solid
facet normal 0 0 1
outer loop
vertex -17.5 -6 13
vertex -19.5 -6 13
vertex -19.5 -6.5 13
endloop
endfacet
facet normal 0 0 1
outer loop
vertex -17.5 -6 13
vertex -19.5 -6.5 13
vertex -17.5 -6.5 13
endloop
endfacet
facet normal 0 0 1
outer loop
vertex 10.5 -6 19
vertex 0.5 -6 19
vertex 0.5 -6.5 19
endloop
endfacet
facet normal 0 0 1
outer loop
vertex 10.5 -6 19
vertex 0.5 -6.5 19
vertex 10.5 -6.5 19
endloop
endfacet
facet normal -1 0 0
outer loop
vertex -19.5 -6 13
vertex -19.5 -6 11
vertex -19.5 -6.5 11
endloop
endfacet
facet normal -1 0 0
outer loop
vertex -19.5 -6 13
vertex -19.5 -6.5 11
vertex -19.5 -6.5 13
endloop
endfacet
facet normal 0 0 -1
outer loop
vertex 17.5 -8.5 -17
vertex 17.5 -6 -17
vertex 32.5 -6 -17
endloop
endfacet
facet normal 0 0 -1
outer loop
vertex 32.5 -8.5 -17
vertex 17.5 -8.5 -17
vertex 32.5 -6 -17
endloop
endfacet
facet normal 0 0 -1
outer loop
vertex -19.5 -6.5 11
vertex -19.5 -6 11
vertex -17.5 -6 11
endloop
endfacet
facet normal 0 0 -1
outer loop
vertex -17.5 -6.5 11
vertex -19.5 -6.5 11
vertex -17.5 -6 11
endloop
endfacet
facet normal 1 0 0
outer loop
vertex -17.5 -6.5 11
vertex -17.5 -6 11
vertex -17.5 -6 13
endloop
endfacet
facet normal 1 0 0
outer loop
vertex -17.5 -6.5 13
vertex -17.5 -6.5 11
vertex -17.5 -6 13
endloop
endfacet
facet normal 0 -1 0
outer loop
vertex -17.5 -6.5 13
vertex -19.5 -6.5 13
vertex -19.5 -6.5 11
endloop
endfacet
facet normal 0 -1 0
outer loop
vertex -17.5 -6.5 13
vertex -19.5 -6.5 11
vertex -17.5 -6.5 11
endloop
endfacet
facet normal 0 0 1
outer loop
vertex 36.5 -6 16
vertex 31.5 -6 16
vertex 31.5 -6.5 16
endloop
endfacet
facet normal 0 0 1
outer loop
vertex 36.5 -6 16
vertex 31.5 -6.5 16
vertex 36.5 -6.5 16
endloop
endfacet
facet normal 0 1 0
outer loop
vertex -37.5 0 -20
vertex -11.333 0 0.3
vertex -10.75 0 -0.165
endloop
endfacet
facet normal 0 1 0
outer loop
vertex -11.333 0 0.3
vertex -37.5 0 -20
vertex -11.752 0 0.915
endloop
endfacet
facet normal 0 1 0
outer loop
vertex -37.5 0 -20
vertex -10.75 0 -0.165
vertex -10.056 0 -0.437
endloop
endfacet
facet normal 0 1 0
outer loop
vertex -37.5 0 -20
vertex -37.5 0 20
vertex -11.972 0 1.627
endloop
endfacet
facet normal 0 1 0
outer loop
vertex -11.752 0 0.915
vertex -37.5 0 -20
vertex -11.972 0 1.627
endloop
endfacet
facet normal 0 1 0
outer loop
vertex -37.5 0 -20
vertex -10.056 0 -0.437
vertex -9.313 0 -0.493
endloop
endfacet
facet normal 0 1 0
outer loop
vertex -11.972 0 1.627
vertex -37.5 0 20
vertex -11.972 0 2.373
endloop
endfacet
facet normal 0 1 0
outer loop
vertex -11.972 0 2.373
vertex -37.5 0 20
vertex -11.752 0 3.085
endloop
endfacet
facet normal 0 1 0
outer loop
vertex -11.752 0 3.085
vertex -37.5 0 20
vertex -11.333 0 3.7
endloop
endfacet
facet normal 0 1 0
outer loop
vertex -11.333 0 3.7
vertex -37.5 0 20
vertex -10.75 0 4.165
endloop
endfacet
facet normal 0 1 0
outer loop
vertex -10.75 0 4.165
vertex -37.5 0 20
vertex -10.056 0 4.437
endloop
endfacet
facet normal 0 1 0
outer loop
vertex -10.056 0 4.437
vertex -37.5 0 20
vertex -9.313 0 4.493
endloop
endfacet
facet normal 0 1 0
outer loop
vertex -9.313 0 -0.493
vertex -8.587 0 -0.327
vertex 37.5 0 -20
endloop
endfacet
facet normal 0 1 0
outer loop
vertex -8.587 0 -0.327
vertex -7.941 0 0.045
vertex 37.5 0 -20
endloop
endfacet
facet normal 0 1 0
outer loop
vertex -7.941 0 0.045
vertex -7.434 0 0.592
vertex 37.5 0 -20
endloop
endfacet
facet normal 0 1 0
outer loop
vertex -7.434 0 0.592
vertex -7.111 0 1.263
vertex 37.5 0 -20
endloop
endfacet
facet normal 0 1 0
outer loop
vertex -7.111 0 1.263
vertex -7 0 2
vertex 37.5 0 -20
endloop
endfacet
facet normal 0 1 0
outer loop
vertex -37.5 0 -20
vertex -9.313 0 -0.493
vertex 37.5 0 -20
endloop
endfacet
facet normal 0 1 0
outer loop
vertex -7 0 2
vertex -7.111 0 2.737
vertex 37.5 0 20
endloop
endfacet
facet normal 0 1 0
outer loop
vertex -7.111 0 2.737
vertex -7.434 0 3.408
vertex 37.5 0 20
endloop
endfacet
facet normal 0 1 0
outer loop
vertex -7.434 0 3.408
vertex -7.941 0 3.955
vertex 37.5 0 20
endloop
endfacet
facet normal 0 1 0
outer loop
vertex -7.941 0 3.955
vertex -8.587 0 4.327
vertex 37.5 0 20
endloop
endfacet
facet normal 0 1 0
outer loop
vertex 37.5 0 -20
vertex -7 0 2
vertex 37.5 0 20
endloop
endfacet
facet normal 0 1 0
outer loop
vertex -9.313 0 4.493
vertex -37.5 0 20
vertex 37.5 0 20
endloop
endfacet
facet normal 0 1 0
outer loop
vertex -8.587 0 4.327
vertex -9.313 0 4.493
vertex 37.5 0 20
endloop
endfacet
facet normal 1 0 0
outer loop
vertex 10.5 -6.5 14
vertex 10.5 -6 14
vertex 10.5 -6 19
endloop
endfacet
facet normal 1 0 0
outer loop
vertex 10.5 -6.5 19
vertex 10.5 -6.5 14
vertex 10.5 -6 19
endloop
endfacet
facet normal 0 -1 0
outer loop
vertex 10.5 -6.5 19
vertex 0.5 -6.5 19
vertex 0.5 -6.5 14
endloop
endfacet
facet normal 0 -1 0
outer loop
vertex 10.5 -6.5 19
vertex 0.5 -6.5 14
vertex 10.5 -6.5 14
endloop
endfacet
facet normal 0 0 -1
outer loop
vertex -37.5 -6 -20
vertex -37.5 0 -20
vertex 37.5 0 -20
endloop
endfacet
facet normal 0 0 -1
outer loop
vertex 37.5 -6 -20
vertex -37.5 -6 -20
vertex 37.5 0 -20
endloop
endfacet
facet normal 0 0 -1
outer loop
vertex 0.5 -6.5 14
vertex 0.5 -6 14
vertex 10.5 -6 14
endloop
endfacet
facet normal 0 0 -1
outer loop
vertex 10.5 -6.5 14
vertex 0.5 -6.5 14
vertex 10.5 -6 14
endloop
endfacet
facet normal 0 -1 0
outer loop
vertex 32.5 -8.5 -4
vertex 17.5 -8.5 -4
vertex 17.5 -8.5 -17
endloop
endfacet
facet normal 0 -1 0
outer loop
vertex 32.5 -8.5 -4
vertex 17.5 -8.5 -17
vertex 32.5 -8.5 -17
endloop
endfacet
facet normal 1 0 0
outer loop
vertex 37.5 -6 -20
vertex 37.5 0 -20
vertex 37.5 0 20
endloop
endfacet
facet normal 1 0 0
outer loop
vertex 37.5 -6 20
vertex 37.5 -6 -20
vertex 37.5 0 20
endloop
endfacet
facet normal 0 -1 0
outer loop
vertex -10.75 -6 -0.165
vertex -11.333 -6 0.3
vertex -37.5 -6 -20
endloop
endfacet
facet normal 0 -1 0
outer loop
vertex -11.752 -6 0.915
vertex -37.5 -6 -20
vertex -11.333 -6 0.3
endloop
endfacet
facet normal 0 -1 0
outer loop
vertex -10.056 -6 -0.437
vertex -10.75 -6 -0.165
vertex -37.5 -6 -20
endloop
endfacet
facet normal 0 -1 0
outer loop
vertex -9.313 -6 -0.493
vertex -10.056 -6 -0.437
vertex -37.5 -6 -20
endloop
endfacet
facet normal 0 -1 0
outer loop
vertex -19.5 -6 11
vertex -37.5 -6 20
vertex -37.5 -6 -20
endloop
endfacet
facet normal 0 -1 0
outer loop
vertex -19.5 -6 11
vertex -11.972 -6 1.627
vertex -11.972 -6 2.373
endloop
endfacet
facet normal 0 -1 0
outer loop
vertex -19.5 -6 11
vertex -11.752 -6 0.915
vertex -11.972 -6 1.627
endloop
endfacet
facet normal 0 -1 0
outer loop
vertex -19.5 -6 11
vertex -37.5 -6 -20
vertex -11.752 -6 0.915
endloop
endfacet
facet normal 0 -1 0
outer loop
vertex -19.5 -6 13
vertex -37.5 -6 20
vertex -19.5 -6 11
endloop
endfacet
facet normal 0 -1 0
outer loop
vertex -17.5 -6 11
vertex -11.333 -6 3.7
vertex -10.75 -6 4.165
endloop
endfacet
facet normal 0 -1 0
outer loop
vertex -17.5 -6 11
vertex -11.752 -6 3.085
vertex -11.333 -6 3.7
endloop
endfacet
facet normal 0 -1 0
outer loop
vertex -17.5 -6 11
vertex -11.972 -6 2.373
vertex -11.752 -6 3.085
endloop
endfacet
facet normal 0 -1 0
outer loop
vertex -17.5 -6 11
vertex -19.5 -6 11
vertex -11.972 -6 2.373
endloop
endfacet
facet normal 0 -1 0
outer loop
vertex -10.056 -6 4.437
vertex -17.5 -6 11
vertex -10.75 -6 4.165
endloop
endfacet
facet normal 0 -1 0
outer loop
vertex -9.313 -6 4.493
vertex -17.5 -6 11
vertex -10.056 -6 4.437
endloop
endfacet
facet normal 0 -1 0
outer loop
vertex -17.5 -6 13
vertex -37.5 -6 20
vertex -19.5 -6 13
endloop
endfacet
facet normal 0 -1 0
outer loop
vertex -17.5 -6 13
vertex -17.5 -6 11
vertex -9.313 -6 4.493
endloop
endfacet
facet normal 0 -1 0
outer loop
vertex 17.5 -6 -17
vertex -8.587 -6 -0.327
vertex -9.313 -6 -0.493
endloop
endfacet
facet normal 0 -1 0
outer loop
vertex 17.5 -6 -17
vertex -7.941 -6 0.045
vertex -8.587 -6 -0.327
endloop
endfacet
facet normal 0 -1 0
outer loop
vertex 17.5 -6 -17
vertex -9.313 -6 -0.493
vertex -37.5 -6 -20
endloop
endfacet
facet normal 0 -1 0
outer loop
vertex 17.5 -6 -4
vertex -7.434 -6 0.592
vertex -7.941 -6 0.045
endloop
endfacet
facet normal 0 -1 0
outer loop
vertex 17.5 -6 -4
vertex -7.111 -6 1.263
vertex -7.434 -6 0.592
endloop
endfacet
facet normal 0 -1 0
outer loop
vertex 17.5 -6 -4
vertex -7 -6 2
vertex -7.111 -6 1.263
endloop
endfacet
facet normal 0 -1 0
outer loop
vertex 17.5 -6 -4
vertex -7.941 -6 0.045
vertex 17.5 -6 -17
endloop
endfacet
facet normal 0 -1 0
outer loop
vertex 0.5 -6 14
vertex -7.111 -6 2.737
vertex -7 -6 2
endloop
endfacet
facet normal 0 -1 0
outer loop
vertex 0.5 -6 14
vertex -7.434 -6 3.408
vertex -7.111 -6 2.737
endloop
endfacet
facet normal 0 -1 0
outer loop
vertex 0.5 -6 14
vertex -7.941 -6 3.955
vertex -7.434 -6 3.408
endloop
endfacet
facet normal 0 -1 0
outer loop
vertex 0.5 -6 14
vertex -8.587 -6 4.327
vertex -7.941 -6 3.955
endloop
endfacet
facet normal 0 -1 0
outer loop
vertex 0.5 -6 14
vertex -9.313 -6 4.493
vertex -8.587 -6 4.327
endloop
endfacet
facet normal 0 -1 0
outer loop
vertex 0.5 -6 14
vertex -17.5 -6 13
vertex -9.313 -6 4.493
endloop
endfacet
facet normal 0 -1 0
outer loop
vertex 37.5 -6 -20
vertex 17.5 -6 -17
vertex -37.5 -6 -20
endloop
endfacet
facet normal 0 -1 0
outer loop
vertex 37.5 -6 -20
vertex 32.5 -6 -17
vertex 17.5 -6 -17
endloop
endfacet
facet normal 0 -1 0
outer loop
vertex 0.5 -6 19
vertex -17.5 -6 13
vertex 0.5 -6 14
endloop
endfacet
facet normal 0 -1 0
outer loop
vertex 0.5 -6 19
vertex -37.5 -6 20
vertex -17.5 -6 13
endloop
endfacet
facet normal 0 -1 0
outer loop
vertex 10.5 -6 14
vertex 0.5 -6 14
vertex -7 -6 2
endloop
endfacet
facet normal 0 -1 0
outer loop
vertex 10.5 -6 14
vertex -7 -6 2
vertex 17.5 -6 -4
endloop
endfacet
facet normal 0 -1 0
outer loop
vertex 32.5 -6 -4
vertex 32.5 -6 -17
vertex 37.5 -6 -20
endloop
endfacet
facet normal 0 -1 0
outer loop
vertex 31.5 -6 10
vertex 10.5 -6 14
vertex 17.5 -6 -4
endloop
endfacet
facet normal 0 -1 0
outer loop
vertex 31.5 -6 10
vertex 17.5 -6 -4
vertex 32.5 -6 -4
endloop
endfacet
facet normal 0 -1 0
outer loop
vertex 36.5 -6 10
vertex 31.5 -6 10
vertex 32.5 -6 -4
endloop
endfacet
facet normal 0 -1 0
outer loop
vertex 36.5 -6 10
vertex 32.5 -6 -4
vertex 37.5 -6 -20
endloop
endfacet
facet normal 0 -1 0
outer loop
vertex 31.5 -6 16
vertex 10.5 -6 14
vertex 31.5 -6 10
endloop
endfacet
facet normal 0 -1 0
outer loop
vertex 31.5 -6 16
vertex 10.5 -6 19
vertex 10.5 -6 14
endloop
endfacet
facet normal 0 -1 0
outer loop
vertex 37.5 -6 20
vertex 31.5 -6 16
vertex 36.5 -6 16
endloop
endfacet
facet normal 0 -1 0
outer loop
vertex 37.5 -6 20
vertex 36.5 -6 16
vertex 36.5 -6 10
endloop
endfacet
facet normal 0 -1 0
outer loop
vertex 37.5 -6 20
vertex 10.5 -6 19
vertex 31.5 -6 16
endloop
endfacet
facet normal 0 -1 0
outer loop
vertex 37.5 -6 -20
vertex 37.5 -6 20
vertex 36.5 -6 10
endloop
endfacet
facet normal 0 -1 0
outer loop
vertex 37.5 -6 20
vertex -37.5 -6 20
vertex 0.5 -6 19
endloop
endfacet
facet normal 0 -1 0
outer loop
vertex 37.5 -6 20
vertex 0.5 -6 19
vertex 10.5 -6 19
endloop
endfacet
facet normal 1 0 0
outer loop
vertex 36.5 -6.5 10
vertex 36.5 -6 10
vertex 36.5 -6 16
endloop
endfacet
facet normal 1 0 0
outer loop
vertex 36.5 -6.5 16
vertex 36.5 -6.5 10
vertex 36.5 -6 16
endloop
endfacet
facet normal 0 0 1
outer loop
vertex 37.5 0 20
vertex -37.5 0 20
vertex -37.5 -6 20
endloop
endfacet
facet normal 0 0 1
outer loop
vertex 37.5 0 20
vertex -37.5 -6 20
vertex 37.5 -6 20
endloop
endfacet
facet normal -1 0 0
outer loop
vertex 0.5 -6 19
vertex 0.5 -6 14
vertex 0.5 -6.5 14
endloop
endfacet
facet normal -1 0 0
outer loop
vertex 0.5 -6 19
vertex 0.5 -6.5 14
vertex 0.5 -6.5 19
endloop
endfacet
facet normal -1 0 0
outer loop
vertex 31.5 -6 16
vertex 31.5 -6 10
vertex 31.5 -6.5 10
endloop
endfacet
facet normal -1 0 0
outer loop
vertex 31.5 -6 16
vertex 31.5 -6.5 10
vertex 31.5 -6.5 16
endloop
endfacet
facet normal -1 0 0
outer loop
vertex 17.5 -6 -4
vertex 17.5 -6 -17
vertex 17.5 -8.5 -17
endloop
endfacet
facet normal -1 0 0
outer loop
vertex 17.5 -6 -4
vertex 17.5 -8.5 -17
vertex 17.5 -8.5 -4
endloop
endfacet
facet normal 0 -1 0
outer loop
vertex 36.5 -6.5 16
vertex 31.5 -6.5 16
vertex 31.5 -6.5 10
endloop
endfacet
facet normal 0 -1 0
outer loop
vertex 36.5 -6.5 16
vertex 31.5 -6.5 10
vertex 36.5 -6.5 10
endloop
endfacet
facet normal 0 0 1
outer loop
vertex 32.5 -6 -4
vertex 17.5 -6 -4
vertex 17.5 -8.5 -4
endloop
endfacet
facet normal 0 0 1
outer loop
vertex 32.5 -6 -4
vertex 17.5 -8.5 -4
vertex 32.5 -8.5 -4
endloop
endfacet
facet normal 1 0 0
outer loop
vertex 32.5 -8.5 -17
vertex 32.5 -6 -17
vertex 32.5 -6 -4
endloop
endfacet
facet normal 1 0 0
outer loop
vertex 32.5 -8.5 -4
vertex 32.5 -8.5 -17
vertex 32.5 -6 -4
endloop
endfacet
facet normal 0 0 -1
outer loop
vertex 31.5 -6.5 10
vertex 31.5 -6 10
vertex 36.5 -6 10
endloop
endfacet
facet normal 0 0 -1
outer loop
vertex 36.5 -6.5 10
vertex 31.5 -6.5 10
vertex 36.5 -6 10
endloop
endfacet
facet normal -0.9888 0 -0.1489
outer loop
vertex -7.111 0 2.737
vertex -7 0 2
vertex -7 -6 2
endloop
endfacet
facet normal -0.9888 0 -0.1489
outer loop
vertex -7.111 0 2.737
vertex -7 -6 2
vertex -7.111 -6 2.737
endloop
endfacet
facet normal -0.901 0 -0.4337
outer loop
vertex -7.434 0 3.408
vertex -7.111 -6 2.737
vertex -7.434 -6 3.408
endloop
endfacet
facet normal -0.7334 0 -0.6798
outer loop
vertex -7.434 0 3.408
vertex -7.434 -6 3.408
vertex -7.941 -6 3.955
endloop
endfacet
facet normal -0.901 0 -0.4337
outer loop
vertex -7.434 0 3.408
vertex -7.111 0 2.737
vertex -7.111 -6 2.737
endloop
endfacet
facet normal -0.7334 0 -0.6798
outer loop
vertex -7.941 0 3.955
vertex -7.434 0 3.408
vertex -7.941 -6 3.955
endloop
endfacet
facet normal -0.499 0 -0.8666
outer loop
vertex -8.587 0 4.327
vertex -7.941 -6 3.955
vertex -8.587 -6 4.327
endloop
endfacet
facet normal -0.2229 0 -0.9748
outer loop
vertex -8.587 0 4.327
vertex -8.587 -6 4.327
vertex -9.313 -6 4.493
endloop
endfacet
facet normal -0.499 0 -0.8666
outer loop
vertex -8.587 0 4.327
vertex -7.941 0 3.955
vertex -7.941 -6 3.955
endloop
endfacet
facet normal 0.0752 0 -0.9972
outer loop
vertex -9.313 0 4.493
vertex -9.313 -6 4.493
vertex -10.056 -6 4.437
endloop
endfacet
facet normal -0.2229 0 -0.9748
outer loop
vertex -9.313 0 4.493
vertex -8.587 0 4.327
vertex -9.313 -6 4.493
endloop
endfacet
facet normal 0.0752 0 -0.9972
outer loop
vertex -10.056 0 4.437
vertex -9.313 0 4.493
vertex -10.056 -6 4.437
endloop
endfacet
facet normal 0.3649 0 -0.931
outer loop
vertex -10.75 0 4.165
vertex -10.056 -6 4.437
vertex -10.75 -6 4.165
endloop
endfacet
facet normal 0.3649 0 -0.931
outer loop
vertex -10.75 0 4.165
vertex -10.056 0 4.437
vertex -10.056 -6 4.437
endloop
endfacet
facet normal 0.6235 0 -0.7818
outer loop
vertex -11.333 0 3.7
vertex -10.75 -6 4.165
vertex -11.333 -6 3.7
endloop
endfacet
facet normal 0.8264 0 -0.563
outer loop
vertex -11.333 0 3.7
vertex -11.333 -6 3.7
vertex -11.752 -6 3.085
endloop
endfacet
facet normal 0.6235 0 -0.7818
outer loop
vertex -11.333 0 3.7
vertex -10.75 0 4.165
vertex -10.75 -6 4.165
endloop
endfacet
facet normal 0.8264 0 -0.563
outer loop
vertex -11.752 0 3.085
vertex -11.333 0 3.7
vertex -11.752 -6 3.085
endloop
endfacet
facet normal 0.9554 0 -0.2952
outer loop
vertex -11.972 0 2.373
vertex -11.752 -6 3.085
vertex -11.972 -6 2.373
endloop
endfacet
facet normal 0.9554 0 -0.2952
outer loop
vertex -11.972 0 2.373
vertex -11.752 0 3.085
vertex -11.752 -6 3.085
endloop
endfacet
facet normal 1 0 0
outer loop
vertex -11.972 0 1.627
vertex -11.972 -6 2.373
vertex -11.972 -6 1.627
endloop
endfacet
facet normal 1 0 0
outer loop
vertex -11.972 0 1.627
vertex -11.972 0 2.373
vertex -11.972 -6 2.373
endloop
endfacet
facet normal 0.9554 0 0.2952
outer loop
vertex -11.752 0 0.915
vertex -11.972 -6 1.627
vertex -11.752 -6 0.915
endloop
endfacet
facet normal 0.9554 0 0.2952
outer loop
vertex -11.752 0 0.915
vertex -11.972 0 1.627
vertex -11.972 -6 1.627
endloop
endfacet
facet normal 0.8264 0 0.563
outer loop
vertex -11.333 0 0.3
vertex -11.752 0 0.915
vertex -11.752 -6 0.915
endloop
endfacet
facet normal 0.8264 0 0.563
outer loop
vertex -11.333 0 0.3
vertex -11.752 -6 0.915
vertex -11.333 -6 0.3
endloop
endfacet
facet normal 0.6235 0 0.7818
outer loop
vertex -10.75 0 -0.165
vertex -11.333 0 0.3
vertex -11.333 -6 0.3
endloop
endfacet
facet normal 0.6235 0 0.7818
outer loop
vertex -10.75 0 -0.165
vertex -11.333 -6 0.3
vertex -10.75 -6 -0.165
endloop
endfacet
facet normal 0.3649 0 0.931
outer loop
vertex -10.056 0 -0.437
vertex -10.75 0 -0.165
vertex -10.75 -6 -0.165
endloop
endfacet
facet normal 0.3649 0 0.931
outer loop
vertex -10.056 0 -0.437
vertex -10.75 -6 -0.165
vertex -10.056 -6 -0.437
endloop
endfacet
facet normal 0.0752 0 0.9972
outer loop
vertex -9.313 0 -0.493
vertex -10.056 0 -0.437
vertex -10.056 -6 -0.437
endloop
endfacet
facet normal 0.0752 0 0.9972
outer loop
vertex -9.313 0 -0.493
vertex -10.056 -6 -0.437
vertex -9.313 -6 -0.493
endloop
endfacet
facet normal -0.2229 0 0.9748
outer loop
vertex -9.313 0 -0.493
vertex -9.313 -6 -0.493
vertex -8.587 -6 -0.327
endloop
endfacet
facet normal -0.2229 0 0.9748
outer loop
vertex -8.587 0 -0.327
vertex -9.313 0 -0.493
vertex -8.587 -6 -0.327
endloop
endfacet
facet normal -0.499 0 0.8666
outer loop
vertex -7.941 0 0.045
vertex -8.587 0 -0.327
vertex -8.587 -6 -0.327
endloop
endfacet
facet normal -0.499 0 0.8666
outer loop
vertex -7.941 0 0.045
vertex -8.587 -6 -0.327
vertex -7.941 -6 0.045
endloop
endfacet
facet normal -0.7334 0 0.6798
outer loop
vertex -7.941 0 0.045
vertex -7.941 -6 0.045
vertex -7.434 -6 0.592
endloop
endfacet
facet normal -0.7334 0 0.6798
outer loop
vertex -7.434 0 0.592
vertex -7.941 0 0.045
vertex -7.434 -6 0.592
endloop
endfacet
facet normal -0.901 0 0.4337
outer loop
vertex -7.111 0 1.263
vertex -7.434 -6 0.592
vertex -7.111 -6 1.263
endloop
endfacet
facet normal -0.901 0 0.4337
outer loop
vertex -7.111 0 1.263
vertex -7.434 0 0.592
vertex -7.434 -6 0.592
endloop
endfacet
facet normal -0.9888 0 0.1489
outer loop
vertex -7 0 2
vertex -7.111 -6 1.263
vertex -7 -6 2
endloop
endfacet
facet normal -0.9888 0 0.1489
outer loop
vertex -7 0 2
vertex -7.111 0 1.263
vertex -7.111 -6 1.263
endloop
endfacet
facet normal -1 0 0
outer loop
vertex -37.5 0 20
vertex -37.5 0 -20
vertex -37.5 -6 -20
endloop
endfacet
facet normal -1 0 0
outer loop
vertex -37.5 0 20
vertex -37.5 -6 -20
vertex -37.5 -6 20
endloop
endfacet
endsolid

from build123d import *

# Parameters (mm, degrees)
F0_W     = 75
F0_H     = 40
F0_R     = 2.5
F1_DEPTH = 6
F2_W     = 10
F2_H     = 5
F2_W_2   = 5
F2_H_2   = 6
F2_W_3   = 2
F2_H_3   = 2
F3_DEPTH = 0.5
F4_W     = 15
F4_H     = 13
F5_DEPTH = 2.5


with BuildPart() as f1:
    # F0 (on Front) → F1 (new body)
    with BuildSketch(Plane.XZ):
        Rectangle(F0_W, F0_H)
        with Locations((-9.5, 2)):
            Circle(F0_R, mode=Mode.SUBTRACT)
    extrude(amount=F1_DEPTH)

    # F2 (on face) → F3 (join)
    with BuildSketch(Plane.XZ.offset(6)):
        with Locations((5.5, 16.5)):
            Rectangle(F2_W, F2_H)
        with Locations((34, 13)):
            Rectangle(F2_W_2, F2_H_2)
        with Locations((-18.5, 12)):
            Rectangle(F2_W_3, F2_H_3)
    extrude(amount=F3_DEPTH)

    # F4 (on face) → F5 (join)
    with BuildSketch(Plane.XZ.offset(6)):
        with Locations((25, -10.5)):
            Rectangle(F4_W, F4_H)
    extrude(amount=F5_DEPTH)


solid = f1.part
